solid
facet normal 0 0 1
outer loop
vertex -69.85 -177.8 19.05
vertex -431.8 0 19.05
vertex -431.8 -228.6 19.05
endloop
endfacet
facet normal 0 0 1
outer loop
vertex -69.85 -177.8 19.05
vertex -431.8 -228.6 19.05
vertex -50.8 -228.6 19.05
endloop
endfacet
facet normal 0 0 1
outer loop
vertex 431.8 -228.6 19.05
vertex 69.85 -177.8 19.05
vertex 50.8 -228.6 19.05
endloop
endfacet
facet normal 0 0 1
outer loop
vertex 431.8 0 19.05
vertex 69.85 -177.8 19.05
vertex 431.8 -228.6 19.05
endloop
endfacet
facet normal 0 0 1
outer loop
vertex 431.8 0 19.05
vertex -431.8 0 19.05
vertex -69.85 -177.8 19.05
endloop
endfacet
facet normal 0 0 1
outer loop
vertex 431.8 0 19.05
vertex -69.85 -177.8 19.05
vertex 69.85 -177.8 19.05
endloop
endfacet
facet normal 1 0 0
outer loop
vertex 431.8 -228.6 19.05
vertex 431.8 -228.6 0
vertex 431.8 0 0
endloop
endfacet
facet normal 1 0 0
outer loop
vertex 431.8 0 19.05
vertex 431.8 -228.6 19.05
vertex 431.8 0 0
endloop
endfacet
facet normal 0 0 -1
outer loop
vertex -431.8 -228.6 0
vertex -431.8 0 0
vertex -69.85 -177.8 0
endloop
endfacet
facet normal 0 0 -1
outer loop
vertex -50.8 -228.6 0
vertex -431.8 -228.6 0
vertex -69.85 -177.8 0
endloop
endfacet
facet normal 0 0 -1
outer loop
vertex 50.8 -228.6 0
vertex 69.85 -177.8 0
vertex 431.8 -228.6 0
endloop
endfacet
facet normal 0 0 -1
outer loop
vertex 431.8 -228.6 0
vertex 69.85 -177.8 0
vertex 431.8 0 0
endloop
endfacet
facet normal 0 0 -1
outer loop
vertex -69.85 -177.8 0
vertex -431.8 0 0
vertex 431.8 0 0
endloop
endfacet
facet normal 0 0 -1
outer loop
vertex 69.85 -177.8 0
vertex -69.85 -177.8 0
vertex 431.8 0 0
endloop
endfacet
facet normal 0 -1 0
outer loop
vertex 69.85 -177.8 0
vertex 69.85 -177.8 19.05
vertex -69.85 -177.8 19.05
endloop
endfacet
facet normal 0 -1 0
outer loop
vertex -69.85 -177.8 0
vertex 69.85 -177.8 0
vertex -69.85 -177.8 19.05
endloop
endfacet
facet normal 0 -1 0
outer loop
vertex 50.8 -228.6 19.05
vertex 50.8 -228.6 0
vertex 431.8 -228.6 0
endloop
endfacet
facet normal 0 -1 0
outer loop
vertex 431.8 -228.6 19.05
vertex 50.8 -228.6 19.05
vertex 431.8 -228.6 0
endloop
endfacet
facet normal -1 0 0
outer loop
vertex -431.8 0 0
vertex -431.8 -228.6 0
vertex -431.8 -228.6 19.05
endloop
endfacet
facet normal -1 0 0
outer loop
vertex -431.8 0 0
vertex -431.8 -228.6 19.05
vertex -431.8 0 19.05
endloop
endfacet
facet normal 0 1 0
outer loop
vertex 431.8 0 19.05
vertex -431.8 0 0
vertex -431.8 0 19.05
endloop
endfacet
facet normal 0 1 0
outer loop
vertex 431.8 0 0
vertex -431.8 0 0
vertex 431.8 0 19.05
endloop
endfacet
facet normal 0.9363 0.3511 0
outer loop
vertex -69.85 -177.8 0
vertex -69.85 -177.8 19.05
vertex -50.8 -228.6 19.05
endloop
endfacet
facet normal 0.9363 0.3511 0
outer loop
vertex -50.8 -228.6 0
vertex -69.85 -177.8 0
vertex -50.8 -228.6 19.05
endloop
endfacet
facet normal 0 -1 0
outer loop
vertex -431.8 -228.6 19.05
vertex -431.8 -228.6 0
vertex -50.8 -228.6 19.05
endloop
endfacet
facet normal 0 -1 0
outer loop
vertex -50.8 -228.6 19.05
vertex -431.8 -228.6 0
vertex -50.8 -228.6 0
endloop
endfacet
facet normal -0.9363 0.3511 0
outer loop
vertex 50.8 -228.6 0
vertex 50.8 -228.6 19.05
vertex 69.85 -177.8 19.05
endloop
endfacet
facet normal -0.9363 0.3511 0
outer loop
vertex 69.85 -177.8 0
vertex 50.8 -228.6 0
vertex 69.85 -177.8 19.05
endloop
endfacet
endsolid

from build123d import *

# Parameters (mm, degrees)
F0_W     = 863.6
F0_H     = 228.6
F1_DEPTH = 19.05
F3_DEPTH = 19.051


with BuildPart() as f1:
    # F0 (on Top) → F1 (new body)
    with BuildSketch(Plane.XY):
        with Locations((0, -114.3)):
            Rectangle(F0_W, F0_H)
    extrude(amount=F1_DEPTH)

    # F2 (on face) → F3 (cut, through all)
    with BuildSketch(Plane.XY.offset(19.05)):
        Polygon((-69.85, -177.8), (-50.8, -228.6), (50.8, -228.6), (69.85, -177.8), align=None)
    extrude(amount=-F3_DEPTH, mode=Mode.SUBTRACT)


solid = f1.part
